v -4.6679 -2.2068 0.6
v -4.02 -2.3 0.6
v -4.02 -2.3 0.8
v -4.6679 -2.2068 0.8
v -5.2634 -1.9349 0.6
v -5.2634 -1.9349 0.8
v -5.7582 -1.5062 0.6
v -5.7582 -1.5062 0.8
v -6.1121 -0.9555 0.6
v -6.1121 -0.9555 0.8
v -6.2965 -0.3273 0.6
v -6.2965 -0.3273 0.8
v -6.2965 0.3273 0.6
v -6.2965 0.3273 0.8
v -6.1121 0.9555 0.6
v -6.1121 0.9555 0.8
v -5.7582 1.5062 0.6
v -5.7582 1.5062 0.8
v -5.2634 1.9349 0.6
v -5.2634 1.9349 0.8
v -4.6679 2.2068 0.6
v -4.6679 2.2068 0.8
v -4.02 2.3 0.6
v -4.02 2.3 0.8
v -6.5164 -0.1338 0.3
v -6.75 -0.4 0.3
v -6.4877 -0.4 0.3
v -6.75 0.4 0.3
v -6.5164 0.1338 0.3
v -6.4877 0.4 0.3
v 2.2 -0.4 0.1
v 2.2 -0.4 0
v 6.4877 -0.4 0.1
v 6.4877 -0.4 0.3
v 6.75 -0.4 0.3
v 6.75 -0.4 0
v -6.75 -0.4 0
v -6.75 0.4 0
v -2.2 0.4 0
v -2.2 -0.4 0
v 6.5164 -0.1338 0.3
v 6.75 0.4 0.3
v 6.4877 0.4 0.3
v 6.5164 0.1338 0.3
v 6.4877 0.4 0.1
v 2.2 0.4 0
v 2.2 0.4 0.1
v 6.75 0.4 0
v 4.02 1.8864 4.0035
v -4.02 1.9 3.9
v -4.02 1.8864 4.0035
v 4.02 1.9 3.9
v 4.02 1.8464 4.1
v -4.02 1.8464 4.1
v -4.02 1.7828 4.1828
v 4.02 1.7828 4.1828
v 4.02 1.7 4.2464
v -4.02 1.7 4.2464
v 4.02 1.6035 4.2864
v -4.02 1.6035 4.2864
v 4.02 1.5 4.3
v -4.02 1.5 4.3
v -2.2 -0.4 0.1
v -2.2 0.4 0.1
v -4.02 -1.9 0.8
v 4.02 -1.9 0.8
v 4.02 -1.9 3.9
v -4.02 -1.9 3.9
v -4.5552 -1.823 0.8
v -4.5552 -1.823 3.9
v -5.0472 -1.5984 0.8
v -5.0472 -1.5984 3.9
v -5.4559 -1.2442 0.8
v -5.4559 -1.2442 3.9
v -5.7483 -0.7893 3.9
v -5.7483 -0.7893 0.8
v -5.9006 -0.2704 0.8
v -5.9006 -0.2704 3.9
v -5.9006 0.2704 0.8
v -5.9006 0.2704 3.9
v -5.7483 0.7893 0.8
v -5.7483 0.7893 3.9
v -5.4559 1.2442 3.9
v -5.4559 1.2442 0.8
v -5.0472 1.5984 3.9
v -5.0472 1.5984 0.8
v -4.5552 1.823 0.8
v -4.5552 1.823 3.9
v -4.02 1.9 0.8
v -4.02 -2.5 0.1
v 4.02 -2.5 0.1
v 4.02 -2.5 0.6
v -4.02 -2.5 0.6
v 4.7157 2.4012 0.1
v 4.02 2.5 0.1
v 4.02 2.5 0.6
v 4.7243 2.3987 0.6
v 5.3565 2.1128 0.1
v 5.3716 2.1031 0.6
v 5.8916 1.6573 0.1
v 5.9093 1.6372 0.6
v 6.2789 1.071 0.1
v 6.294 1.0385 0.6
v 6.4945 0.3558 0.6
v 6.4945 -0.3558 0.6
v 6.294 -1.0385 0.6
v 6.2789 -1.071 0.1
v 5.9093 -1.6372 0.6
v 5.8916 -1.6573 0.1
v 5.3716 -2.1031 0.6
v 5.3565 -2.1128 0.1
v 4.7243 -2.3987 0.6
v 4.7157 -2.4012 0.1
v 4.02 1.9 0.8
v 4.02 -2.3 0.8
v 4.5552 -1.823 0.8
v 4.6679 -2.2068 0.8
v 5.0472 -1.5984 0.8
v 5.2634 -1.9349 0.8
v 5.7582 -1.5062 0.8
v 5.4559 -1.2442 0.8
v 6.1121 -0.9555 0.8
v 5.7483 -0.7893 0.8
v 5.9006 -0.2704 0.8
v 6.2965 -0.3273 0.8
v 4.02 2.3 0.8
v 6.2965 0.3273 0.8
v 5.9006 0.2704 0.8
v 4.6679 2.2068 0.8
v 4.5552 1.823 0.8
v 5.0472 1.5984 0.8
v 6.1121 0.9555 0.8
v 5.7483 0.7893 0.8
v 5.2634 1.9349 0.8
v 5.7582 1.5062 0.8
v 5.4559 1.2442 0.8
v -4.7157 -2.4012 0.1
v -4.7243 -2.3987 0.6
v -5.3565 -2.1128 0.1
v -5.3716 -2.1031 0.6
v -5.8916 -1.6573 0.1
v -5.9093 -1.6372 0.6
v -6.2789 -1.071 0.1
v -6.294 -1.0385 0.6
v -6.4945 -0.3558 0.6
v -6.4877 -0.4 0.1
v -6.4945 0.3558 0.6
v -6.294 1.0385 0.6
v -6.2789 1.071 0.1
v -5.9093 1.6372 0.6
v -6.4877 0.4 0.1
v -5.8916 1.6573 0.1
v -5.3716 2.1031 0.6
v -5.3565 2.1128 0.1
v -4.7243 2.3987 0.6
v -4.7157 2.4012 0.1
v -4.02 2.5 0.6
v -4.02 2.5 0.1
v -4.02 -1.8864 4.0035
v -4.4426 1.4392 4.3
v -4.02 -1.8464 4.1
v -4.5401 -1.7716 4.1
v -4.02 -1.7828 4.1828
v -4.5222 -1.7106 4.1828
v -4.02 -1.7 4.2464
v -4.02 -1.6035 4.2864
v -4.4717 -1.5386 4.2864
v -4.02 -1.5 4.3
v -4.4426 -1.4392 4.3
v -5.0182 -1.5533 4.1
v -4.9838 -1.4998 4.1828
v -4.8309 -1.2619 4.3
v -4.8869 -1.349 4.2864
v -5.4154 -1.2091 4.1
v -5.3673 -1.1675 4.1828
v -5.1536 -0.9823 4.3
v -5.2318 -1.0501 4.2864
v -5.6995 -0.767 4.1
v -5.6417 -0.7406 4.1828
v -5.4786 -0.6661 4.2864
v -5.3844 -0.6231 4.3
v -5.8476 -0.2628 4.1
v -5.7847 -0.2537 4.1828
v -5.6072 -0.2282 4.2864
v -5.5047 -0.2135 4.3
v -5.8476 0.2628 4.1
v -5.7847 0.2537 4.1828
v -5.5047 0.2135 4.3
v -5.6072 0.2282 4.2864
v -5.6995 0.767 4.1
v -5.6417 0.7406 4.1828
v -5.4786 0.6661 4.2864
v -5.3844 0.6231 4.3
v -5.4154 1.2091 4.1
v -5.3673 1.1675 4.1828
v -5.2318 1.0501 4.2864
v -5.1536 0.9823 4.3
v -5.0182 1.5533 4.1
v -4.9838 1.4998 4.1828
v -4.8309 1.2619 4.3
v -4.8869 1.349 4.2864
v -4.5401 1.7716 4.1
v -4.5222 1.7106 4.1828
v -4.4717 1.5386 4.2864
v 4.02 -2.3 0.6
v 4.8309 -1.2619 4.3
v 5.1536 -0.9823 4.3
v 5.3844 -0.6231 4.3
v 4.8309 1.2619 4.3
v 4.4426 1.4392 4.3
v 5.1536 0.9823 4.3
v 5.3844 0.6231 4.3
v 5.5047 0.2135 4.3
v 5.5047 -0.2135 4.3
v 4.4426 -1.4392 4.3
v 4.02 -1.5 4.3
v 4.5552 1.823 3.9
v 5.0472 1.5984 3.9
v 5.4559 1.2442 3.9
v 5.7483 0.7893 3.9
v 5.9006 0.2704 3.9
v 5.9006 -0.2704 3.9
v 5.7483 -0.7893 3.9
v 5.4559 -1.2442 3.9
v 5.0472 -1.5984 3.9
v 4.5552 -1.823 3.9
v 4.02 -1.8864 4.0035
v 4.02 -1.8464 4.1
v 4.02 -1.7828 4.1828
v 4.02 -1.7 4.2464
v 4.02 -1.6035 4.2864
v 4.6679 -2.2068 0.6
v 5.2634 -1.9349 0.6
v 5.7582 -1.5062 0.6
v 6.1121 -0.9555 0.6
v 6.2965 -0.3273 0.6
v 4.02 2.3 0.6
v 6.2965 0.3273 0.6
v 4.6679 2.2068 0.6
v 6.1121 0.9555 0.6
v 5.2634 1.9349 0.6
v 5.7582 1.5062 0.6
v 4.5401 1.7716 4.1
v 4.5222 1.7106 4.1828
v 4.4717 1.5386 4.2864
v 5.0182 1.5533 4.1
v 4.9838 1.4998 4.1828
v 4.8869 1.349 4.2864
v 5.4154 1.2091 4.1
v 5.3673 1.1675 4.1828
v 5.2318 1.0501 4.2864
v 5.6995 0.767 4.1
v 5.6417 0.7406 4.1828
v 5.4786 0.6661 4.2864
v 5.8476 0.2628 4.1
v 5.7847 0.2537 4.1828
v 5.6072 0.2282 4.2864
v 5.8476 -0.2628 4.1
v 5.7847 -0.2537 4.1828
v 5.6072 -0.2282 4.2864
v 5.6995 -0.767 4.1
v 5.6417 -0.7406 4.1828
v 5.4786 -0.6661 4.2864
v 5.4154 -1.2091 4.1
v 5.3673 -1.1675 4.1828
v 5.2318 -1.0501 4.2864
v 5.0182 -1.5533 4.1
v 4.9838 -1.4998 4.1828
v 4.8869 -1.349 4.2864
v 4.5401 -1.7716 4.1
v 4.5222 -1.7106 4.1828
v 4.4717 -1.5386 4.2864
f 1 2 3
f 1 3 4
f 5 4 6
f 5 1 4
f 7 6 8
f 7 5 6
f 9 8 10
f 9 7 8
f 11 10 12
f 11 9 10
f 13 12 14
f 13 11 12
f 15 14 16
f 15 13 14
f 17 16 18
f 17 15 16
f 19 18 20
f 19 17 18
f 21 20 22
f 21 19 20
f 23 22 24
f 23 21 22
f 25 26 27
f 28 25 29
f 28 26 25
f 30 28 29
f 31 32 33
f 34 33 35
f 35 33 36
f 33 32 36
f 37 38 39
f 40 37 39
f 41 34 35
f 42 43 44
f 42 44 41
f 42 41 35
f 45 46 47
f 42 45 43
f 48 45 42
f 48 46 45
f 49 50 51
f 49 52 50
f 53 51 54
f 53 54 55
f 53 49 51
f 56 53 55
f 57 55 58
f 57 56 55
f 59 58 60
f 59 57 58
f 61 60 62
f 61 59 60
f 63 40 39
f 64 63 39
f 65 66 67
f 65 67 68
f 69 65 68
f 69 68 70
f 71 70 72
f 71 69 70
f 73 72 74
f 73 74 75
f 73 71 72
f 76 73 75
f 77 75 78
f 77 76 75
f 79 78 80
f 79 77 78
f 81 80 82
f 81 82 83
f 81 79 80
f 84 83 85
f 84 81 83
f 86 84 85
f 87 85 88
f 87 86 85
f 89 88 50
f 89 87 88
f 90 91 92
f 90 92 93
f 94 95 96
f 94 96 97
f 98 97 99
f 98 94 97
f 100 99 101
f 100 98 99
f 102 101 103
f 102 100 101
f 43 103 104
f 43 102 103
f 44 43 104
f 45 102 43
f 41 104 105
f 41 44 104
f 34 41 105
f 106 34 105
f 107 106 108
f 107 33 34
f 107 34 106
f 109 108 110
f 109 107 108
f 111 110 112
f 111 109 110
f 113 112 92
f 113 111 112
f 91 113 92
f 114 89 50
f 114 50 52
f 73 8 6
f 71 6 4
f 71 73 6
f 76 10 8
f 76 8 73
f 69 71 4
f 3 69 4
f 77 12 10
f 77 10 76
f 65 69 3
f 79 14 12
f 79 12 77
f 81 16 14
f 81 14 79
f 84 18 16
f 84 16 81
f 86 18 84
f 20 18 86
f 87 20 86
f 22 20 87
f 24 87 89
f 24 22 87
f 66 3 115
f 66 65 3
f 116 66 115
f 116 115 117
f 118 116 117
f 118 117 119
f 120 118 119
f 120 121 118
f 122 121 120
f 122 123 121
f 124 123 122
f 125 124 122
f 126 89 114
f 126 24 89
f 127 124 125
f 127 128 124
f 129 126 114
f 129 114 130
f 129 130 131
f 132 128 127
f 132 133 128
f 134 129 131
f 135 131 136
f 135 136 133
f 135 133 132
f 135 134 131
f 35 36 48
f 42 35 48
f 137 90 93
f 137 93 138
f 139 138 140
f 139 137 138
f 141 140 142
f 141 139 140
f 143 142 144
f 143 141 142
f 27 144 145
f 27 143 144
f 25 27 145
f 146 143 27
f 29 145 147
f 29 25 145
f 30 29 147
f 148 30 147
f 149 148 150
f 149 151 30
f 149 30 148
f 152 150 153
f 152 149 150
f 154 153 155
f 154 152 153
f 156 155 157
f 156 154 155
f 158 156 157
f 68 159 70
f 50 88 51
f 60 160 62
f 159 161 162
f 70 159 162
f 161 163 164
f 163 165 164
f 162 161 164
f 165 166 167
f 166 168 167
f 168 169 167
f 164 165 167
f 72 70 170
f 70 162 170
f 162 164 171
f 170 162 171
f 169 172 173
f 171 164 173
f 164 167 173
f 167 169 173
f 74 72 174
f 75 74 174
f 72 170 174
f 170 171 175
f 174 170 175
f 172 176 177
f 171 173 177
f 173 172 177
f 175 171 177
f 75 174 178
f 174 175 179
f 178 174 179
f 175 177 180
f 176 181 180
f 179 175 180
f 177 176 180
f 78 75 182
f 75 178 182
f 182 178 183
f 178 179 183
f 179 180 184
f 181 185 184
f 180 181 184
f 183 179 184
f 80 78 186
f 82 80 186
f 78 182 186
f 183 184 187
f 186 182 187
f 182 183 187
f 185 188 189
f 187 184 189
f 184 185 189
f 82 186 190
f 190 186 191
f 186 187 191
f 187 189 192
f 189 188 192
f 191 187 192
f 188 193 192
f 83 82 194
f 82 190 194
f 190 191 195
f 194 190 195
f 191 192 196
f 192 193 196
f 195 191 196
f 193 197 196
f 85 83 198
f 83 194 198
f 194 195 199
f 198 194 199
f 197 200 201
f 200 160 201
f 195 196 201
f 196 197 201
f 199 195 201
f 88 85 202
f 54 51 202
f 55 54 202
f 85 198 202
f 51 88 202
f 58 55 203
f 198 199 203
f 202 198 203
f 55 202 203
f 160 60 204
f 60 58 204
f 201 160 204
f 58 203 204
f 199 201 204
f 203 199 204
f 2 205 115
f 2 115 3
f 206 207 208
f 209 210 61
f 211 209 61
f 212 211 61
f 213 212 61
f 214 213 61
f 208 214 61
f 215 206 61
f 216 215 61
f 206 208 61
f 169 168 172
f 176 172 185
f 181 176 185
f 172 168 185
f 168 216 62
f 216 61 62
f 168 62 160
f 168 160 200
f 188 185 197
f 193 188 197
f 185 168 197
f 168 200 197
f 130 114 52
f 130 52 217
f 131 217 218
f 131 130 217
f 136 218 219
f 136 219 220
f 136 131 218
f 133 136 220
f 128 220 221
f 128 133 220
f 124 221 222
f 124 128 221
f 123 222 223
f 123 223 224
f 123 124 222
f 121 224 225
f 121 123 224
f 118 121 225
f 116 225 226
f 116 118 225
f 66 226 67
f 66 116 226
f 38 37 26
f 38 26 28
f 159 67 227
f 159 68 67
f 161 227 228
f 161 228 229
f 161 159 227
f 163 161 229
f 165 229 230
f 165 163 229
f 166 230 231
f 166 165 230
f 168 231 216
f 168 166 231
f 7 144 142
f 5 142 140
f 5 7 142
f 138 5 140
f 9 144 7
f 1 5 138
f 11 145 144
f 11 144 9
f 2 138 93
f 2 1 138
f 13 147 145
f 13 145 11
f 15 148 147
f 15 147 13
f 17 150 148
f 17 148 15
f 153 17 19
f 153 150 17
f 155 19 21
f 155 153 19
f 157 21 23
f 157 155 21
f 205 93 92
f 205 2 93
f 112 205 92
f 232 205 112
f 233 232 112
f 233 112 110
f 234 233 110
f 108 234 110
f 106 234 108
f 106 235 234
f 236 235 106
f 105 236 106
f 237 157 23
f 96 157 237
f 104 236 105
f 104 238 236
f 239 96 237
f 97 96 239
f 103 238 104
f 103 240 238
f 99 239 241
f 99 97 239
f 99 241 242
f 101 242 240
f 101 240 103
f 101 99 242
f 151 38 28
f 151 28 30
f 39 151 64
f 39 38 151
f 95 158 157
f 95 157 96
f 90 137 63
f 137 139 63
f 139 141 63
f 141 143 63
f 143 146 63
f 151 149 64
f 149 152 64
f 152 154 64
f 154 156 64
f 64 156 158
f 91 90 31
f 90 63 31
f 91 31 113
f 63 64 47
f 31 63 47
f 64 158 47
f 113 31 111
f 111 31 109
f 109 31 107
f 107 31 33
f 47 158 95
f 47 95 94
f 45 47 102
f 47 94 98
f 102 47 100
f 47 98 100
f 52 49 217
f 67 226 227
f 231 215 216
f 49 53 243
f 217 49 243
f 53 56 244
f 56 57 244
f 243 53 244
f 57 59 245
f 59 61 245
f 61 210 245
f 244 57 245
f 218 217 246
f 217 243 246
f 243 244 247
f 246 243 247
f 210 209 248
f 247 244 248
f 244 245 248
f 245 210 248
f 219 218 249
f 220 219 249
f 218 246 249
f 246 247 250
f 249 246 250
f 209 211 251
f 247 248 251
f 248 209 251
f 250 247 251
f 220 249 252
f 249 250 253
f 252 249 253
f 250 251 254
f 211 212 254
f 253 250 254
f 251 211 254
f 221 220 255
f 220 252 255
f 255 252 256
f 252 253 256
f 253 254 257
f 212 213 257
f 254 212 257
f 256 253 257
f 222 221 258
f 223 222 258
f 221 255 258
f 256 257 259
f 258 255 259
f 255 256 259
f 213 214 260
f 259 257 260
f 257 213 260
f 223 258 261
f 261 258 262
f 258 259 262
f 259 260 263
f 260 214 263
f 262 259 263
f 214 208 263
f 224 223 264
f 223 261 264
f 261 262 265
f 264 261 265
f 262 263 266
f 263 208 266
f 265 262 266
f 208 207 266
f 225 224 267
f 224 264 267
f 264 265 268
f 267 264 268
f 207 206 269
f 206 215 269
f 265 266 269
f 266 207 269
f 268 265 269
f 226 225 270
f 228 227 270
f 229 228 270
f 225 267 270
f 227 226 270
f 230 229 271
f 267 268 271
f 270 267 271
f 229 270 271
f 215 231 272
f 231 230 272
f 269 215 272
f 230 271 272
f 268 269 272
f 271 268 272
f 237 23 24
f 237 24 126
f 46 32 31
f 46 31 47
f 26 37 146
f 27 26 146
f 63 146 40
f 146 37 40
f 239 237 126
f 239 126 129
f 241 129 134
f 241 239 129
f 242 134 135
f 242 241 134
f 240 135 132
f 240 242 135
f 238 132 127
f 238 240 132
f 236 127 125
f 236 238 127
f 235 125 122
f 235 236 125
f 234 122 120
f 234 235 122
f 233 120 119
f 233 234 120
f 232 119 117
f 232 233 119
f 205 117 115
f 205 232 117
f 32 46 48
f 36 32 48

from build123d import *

# Parameters (mm, degrees)
BOSS_EXTRUDE1_DEPTH = 4.3
CUT_EXTRUDE1_START  = 0.8
SKETCH2_OUTSIDE_W   = 17.962
SKETCH2_OUTSIDE_H   = 9.922
CUT_EXTRUDE1_DEPTH  = 4.5
FILLET1_R           = 0.4
CUT_EXTRUDE2_START  = 0.6
SKETCH3_OUTSIDE_W   = 17.962
SKETCH3_OUTSIDE_H   = 9.922
CUT_EXTRUDE2_DEPTH  = 4.7
SKETCH5_W           = 15.203925075
SKETCH5_H           = 7.601962538
CUT_EXTRUDE3_DEPTH  = 0.1
SKETCH6_W           = 4.55
SKETCH6_H           = 0.8
BOSS_EXTRUDE2_DEPTH = 0.3


with BuildPart() as part:
    # Sketch1 → Boss-Extrude1 (new body)
    with BuildSketch(Plane.XY):
        with BuildLine():
            Line((-4.019954666, 2.5), (4.019954666, 2.5))
            ThreePointArc((4.019954666, 2.5), (6.519954666, 0), (4.019954666, -2.5))
            Line((4.019954666, -2.5), (-4.019954666, -2.5))
            ThreePointArc((-4.019954666, -2.5), (-6.519954666, 0), (-4.019954666, 2.5))
        make_face()
    extrude(amount=BOSS_EXTRUDE1_DEPTH)

    # Sketch2 outside → Cut-Extrude1 (cut, through all)
    with BuildSketch(Plane.XY.offset(CUT_EXTRUDE1_START)):
        Rectangle(SKETCH2_OUTSIDE_W, SKETCH2_OUTSIDE_H)
        with BuildLine():
            Line((-4.019954666, 1.9), (4.019954666, 1.9))
            ThreePointArc((4.019954666, 1.9), (5.919954666, 0), (4.019954666, -1.9))
            Line((4.019954666, -1.9), (-4.019954666, -1.9))
            ThreePointArc((-4.019954666, -1.9), (-5.919954666, 0), (-4.019954666, 1.9))
        make_face(mode=Mode.SUBTRACT)
    extrude(amount=CUT_EXTRUDE1_DEPTH, mode=Mode.SUBTRACT)

    # Fillet1
    fillet1_edges = [part.edges().sort_by_distance(p)[0] for p in [
        (-5.919954666, 0, 4.3),
        (0, -1.9, 4.3),
        (5.919954666, 0, 4.3),
        (0, 1.9, 4.3),
    ]]
    fillet(fillet1_edges, radius=FILLET1_R)

    # Sketch3 outside → Cut-Extrude2 (cut, through all)
    with BuildSketch(Plane.XY.offset(CUT_EXTRUDE2_START)):
        Rectangle(SKETCH3_OUTSIDE_W, SKETCH3_OUTSIDE_H)
        with BuildLine():
            Line((-4.019954666, 2.3), (4.019954666, 2.3))
            ThreePointArc((4.019954666, 2.3), (6.319954666, 0), (4.019954666, -2.3))
            Line((4.019954666, -2.3), (-4.019954666, -2.3))
            ThreePointArc((-4.019954666, -2.3), (-6.319954666, 0), (-4.019954666, 2.3))
        make_face(mode=Mode.SUBTRACT)
    extrude(amount=CUT_EXTRUDE2_DEPTH, mode=Mode.SUBTRACT)

    # Sketch5 → Cut-Extrude3 (cut)
    with BuildSketch(Plane.XY):
        with Locations((0.247324124, -0.273358242)):
            Rectangle(SKETCH5_W, SKETCH5_H)
    extrude(amount=CUT_EXTRUDE3_DEPTH, mode=Mode.SUBTRACT)

    # Sketch6 → Boss-Extrude2 (add)
    with BuildSketch(Plane.XY):
        with Locations((-4.475, 0)):
            Rectangle(SKETCH6_W, SKETCH6_H)
        with Locations((4.475, 0)):
            Rectangle(SKETCH6_W, SKETCH6_H)
    extrude(amount=BOSS_EXTRUDE2_DEPTH)


solid = part.part
